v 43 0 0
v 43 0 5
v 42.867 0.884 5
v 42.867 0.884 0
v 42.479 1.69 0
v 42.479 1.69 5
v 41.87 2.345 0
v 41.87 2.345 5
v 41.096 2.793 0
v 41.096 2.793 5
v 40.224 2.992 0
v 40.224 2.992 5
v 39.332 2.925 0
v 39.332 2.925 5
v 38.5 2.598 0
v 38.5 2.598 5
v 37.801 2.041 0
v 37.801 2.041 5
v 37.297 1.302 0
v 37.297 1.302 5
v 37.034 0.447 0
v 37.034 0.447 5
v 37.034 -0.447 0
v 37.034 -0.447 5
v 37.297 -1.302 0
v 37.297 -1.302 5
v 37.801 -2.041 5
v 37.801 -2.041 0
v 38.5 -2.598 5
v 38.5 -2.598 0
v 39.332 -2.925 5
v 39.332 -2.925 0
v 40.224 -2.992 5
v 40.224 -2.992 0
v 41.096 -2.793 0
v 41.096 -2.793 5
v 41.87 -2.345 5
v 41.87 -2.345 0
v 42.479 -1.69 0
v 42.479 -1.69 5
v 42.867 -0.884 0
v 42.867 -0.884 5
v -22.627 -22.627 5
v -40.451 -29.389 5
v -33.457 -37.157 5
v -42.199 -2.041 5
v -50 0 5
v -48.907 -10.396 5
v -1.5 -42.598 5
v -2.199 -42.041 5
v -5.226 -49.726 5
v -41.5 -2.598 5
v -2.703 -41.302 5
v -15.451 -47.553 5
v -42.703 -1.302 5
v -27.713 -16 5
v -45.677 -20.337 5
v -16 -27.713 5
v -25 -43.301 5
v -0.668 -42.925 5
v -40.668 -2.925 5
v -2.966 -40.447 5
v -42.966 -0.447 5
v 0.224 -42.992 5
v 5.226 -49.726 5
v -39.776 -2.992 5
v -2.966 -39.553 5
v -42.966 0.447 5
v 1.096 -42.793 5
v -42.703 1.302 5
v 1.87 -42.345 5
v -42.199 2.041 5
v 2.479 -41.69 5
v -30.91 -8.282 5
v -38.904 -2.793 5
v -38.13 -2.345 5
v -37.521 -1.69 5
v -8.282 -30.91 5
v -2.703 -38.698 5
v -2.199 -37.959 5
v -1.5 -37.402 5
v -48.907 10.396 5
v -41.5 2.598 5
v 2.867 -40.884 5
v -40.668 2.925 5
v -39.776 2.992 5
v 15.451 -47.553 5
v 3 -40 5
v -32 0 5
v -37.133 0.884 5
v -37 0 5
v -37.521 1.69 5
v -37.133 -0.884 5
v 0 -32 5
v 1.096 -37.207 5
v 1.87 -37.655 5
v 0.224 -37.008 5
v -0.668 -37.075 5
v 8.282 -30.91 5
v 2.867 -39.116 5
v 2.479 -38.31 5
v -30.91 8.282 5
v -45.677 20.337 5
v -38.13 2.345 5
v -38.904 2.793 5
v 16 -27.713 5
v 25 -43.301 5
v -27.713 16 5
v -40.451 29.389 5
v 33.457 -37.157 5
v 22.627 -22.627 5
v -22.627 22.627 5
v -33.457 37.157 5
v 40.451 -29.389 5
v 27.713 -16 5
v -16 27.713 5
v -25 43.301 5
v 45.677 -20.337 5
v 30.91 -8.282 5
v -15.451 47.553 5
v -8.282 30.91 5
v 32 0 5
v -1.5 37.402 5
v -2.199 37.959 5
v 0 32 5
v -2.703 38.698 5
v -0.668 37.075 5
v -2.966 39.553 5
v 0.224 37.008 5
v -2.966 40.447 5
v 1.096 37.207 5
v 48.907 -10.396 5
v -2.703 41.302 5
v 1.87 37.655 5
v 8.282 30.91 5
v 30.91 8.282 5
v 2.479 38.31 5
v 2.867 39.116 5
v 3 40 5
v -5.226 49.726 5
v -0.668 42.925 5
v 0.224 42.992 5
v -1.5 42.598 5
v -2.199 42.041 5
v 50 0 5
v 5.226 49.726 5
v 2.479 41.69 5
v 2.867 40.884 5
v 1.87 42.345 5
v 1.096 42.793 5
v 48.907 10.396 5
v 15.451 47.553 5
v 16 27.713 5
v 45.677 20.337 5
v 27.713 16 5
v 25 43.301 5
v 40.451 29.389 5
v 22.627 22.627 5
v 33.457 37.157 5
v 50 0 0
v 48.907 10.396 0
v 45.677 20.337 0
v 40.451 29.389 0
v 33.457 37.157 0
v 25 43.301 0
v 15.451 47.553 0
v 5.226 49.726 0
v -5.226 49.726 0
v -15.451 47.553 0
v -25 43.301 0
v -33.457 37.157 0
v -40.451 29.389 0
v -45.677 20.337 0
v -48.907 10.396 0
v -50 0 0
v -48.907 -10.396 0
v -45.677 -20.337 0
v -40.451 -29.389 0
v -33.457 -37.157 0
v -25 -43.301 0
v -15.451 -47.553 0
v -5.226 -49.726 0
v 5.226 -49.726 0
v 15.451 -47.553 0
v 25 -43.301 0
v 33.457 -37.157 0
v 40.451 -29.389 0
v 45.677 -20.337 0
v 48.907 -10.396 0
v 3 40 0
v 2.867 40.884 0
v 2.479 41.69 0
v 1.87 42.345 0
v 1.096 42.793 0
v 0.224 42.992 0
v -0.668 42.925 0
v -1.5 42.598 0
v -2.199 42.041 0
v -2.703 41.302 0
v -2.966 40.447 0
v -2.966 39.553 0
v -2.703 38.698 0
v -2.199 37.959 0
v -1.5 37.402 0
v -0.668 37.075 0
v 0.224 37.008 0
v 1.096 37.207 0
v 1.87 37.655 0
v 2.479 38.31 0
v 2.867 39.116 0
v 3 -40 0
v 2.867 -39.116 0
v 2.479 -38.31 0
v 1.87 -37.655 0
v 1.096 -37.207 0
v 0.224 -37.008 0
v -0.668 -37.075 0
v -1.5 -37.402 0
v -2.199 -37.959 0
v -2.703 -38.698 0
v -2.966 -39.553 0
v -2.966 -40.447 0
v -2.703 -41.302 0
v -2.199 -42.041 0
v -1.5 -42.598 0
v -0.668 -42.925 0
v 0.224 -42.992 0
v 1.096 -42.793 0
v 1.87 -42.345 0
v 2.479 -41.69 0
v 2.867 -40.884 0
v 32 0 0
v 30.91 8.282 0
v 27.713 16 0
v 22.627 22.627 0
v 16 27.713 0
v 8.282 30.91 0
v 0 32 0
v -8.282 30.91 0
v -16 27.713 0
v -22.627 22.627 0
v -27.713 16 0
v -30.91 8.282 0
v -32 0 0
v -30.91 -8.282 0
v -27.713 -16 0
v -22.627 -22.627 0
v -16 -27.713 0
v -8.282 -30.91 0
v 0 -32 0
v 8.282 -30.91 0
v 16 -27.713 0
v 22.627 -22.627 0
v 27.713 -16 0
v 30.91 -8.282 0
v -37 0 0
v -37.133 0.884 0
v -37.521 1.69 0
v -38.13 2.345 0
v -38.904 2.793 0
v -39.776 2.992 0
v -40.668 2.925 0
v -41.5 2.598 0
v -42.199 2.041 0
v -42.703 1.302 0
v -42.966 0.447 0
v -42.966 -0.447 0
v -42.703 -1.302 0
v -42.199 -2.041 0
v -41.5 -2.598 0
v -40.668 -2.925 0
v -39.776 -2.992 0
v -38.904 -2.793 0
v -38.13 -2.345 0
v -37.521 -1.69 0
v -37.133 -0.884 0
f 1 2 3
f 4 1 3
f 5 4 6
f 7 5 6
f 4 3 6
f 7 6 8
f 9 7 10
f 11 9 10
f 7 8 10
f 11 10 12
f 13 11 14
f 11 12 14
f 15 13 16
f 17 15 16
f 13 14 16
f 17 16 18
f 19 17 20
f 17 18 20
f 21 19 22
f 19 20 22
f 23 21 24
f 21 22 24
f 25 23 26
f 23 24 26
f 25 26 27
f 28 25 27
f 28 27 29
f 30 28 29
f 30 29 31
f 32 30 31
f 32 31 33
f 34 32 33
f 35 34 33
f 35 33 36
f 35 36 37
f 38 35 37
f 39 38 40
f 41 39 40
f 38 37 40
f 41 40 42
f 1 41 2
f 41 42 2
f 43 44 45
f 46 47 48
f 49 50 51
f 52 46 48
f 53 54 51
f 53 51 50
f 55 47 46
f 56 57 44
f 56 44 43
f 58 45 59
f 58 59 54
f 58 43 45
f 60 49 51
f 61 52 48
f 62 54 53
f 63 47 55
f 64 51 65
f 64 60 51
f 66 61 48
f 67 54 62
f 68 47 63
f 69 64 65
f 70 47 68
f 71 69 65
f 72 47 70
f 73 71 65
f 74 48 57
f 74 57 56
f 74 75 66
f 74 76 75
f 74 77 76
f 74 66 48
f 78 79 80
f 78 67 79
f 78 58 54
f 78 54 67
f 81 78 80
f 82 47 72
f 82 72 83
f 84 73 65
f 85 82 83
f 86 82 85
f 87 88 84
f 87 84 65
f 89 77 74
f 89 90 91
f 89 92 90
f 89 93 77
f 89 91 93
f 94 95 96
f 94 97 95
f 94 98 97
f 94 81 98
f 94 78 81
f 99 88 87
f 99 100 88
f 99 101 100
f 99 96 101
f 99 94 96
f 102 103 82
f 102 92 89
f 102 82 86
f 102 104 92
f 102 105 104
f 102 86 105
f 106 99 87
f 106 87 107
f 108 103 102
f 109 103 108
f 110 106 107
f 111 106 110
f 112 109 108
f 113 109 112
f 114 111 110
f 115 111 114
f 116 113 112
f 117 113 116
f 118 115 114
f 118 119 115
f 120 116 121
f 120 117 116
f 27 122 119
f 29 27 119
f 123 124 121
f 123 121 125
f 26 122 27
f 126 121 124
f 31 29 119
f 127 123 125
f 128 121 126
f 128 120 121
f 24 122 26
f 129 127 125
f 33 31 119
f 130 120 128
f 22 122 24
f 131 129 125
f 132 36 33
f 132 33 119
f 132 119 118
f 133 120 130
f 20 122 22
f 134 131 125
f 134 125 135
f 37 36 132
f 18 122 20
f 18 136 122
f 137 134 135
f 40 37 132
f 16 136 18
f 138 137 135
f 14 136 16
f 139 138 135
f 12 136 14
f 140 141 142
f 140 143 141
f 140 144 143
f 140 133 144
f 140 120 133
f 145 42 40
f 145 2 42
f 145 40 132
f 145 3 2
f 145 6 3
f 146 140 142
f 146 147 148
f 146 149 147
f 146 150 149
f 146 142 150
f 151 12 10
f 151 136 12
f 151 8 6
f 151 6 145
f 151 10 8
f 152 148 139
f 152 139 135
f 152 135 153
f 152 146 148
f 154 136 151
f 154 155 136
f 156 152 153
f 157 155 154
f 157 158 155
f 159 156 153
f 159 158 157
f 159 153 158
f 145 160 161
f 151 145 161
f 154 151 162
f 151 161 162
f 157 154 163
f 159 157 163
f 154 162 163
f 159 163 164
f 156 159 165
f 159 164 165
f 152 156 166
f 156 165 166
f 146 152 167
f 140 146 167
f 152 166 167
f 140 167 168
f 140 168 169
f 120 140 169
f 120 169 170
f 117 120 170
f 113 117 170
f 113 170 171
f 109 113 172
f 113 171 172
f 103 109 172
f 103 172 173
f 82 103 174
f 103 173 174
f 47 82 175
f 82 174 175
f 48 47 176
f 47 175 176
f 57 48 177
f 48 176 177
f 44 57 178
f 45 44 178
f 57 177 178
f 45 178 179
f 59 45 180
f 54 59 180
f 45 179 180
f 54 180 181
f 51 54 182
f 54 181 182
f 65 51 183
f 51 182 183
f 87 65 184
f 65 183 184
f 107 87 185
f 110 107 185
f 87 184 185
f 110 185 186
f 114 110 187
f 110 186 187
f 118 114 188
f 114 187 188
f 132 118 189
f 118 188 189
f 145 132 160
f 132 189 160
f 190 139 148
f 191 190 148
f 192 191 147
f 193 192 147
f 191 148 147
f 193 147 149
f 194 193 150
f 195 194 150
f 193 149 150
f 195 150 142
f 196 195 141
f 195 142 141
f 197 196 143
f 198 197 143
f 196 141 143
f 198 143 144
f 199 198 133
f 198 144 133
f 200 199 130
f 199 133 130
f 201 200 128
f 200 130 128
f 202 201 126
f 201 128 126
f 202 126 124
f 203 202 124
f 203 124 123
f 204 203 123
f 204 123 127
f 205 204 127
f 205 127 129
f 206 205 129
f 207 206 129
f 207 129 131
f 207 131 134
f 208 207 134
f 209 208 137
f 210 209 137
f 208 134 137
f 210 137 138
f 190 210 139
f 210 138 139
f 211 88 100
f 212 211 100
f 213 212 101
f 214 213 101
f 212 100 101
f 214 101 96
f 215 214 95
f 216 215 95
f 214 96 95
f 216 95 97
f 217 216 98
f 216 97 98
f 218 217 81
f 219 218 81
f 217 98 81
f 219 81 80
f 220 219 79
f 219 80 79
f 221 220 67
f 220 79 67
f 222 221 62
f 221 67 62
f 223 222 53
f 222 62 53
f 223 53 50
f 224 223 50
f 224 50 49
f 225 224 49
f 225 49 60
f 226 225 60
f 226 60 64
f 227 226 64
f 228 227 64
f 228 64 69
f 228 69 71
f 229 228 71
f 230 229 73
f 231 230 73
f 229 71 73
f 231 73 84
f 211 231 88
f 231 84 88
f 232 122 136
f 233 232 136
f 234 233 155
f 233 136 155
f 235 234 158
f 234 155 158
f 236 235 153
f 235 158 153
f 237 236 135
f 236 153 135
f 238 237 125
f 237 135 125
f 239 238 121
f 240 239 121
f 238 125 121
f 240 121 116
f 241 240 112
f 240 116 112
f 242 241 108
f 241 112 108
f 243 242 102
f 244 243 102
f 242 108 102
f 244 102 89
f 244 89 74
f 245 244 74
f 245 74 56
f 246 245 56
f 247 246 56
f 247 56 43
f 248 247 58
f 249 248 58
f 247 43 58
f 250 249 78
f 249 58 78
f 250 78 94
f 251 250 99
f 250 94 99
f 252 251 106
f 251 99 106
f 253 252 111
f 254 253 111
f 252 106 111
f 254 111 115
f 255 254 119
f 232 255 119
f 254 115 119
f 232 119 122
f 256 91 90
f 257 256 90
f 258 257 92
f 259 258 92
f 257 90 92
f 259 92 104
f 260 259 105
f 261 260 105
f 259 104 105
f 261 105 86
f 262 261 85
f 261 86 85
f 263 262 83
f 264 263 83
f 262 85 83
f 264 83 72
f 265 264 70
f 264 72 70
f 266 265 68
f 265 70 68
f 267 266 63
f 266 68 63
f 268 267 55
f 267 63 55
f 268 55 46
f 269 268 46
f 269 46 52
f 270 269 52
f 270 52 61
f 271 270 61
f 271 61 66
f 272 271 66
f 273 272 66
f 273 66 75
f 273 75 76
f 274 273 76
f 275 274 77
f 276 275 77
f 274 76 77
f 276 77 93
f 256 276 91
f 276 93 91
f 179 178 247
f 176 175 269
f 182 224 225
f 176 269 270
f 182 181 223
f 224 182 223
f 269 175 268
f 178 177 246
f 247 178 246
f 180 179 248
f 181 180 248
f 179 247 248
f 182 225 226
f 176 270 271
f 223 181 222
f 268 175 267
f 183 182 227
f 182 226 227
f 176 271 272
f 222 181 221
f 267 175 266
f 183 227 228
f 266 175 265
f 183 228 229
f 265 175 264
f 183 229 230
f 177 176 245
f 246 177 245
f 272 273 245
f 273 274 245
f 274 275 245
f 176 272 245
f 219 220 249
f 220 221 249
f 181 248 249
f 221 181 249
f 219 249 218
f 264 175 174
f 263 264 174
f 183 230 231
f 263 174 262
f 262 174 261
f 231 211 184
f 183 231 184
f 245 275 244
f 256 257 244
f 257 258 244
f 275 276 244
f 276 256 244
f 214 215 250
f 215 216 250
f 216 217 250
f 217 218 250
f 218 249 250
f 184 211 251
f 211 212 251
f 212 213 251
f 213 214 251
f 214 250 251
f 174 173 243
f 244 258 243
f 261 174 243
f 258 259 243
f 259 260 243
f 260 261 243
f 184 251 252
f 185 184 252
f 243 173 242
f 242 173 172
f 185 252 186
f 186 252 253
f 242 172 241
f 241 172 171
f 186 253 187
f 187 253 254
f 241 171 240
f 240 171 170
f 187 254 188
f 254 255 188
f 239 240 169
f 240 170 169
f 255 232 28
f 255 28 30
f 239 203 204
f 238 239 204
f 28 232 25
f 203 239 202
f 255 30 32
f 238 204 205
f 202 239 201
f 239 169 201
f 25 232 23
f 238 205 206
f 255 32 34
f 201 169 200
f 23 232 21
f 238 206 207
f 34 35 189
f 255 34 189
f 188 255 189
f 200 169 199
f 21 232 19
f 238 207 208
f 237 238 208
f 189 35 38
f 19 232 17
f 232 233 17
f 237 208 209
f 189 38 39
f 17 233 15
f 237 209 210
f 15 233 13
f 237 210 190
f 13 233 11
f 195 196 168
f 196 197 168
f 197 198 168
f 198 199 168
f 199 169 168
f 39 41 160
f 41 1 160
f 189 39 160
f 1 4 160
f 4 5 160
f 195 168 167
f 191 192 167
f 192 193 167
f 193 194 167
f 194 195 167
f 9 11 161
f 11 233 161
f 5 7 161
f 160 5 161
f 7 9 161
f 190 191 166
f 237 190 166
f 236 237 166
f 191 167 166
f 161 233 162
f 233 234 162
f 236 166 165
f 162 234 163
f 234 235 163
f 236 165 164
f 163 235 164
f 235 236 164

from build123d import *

# Parameters (mm, degrees)
SZKIC1_R                    = 50
DODANIE_WYCI_GNI_CIE1_DEPTH = 5
SZKIC2_R                    = 32
WYTNIJ_WYCI_GNI_CIE1_DEPTH  = 5
SZKIC3_R                    = 3
WYTNIJ_WYCI_GNI_CIE2_DEPTH  = 5


with BuildPart() as part:
    # Szkic1 → Dodanie-wyciągnięcie1 (new body)
    with BuildSketch(Plane.XY):
        Circle(SZKIC1_R)
    extrude(amount=DODANIE_WYCI_GNI_CIE1_DEPTH)

    # Szkic2 → Wytnij-wyciągnięcie1 (cut)
    with BuildSketch(Plane.XY.offset(5)):
        Circle(SZKIC2_R)
    extrude(amount=-WYTNIJ_WYCI_GNI_CIE1_DEPTH, mode=Mode.SUBTRACT)

    # Szkic3 → Wytnij-wyciągnięcie2 (cut)
    with BuildSketch(Plane.XY.offset(5)):
        with Locations((0, 40)):
            Circle(SZKIC3_R)
        with Locations((40, 0)):
            Circle(SZKIC3_R)
        with Locations((0, -40)):
            Circle(SZKIC3_R)
        with Locations((-40, 0)):
            Circle(SZKIC3_R)
    extrude(amount=-WYTNIJ_WYCI_GNI_CIE2_DEPTH, mode=Mode.SUBTRACT)


solid = part.part
